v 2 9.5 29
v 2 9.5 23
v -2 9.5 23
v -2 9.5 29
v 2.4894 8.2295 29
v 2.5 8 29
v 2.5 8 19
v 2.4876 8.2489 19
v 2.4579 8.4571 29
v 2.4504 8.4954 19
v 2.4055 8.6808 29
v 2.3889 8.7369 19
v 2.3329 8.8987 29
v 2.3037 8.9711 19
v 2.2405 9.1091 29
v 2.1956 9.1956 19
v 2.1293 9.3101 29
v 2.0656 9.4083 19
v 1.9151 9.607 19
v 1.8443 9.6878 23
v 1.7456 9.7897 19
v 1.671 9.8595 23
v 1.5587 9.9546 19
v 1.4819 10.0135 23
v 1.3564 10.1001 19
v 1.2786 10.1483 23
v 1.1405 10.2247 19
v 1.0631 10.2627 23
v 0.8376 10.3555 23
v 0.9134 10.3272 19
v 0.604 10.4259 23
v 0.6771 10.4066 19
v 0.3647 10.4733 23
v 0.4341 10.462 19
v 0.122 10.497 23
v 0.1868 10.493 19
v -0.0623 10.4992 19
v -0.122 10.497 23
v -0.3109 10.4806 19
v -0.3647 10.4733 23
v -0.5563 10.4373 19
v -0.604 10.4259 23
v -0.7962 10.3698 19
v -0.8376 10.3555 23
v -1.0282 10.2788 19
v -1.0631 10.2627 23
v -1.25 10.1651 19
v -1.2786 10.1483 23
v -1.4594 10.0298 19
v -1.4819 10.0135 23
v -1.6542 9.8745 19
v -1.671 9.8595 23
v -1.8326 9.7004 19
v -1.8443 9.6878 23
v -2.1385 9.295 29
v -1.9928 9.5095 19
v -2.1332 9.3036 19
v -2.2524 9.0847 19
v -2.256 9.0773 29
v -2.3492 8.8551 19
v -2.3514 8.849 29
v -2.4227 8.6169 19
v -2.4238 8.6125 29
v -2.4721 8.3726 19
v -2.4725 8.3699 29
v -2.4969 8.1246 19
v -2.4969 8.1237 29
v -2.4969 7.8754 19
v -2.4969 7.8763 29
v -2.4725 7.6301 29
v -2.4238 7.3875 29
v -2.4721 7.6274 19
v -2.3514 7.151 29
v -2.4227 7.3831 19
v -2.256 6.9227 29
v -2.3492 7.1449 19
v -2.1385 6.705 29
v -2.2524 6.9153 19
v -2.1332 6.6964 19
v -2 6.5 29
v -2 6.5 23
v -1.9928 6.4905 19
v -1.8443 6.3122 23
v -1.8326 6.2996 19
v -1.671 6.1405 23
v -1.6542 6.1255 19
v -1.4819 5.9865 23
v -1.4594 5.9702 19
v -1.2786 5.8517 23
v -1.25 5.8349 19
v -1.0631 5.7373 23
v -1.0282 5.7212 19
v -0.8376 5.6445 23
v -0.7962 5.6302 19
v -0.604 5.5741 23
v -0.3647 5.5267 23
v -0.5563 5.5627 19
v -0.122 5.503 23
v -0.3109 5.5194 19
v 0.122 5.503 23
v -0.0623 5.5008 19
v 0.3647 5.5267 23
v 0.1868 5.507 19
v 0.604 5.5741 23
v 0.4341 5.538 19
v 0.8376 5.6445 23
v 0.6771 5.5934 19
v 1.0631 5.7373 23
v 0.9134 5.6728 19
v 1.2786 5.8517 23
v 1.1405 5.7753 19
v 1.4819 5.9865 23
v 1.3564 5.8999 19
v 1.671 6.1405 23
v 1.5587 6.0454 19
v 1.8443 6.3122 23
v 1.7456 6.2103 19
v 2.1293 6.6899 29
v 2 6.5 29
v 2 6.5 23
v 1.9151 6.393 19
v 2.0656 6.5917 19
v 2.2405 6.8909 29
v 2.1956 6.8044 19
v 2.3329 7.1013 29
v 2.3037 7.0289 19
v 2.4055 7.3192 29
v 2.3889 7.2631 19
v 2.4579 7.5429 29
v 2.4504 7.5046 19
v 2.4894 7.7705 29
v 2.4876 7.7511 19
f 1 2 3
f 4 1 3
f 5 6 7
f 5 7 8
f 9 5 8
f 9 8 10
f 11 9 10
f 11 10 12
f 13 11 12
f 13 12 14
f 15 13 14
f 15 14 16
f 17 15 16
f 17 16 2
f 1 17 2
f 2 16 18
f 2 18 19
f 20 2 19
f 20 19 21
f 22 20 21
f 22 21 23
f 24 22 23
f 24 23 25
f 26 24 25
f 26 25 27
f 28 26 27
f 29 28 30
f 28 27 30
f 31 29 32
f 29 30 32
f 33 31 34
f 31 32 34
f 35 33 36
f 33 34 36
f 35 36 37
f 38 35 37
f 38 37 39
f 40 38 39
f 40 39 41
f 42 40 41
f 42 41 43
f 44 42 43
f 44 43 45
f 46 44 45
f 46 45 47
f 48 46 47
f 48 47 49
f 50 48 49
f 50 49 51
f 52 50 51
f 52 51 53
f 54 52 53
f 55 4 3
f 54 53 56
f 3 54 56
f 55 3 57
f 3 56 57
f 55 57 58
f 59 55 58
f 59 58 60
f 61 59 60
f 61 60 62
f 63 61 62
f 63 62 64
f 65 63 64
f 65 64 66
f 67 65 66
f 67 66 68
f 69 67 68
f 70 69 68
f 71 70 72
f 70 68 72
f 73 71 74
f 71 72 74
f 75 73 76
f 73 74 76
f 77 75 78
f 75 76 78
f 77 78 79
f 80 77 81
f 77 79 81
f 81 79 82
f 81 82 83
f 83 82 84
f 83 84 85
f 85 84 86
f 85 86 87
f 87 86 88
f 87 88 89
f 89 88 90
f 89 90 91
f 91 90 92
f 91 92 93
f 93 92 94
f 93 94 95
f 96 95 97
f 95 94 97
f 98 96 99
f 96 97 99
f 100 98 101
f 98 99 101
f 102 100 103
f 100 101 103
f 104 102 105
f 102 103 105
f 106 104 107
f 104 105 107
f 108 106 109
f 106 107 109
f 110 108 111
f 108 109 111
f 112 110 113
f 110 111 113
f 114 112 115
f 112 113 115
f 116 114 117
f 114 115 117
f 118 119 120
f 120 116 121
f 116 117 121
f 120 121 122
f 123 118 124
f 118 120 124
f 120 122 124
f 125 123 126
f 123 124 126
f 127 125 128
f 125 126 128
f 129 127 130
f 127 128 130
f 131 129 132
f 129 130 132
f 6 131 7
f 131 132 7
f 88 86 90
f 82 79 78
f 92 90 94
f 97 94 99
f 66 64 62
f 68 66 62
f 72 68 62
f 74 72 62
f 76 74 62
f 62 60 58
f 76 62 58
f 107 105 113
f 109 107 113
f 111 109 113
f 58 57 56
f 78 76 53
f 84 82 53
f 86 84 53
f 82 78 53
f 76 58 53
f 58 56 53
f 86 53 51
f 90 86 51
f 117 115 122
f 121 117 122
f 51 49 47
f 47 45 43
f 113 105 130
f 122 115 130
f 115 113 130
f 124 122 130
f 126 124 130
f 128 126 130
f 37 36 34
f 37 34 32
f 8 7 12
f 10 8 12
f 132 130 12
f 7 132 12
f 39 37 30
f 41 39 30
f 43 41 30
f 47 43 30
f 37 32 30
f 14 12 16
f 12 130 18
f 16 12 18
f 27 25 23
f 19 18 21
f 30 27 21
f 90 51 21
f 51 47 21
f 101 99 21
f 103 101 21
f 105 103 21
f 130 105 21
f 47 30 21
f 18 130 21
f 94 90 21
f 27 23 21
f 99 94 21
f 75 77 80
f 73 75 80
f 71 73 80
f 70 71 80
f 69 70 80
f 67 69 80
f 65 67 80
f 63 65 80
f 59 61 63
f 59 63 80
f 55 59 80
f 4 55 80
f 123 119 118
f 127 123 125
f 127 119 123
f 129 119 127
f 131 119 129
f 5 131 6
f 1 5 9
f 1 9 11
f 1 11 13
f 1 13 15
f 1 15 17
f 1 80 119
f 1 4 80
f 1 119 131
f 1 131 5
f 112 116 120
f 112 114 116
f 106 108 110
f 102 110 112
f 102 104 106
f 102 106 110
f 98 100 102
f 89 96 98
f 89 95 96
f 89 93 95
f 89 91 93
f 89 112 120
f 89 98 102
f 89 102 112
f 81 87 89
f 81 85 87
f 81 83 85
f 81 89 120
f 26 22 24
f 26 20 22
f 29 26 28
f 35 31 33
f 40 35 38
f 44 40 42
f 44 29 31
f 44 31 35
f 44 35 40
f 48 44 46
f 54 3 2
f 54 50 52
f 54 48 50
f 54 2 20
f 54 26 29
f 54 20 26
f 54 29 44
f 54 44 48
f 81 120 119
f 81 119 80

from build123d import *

# Parameters (mm, degrees)
BOX012_W               = 1
BOX012_H               = 5
BOX012_DEPTH           = 6
BOX012_PLACEMENT_ANGLE = 90
BOX011_W               = 1
BOX011_H               = 5
BOX011_DEPTH           = 6
BOX011_PLACEMENT_ANGLE = 90
CYLINDER017_R          = 2.5
CYLINDER017_DEPTH      = 10


with BuildPart() as cubo008:
    # Box012 → Box012 (new body)
    with BuildSketch(Plane.XY):
        with Locations((0.5, 2.5)):
            Rectangle(BOX012_W, BOX012_H)
    extrude(amount=BOX012_DEPTH)


with BuildPart() as cubo008_1:
    # Box012 placement: moved
    add(cubo008.part.moved(Location((2.5, -2.5, 4))).rotate(Axis((2.5, -2.5, 4), (0, 0, 1)), BOX012_PLACEMENT_ANGLE))


with BuildPart() as fusion008:
    # Box011 → Box011 (new body)
    with BuildSketch(Plane.XY):
        with Locations((0.5, 2.5)):
            Rectangle(BOX011_W, BOX011_H)
    extrude(amount=BOX011_DEPTH)


with BuildPart() as fusion008_1:
    # Box011 placement: moved
    add(fusion008.part.moved(Location((2.5, 1.5, 4))).rotate(Axis((2.5, 1.5, 4), (0, 0, 1)), BOX011_PLACEMENT_ANGLE))

    # Fusion008: union Cubo008
    add(cubo008_1.part)


with BuildPart() as axis_final001:
    # Cylinder017 → Cylinder017 (new body)
    with BuildSketch(Plane.XY):
        Circle(CYLINDER017_R)
    extrude(amount=CYLINDER017_DEPTH)

    # Cut018: cut Fusion008
    add(fusion008_1.part, mode=Mode.SUBTRACT)


with BuildPart() as axis_final001_1:
    # Cut018 placement: moved
    add(axis_final001.part.moved(Location((0, 8, 19))))


solid = axis_final001_1.part
